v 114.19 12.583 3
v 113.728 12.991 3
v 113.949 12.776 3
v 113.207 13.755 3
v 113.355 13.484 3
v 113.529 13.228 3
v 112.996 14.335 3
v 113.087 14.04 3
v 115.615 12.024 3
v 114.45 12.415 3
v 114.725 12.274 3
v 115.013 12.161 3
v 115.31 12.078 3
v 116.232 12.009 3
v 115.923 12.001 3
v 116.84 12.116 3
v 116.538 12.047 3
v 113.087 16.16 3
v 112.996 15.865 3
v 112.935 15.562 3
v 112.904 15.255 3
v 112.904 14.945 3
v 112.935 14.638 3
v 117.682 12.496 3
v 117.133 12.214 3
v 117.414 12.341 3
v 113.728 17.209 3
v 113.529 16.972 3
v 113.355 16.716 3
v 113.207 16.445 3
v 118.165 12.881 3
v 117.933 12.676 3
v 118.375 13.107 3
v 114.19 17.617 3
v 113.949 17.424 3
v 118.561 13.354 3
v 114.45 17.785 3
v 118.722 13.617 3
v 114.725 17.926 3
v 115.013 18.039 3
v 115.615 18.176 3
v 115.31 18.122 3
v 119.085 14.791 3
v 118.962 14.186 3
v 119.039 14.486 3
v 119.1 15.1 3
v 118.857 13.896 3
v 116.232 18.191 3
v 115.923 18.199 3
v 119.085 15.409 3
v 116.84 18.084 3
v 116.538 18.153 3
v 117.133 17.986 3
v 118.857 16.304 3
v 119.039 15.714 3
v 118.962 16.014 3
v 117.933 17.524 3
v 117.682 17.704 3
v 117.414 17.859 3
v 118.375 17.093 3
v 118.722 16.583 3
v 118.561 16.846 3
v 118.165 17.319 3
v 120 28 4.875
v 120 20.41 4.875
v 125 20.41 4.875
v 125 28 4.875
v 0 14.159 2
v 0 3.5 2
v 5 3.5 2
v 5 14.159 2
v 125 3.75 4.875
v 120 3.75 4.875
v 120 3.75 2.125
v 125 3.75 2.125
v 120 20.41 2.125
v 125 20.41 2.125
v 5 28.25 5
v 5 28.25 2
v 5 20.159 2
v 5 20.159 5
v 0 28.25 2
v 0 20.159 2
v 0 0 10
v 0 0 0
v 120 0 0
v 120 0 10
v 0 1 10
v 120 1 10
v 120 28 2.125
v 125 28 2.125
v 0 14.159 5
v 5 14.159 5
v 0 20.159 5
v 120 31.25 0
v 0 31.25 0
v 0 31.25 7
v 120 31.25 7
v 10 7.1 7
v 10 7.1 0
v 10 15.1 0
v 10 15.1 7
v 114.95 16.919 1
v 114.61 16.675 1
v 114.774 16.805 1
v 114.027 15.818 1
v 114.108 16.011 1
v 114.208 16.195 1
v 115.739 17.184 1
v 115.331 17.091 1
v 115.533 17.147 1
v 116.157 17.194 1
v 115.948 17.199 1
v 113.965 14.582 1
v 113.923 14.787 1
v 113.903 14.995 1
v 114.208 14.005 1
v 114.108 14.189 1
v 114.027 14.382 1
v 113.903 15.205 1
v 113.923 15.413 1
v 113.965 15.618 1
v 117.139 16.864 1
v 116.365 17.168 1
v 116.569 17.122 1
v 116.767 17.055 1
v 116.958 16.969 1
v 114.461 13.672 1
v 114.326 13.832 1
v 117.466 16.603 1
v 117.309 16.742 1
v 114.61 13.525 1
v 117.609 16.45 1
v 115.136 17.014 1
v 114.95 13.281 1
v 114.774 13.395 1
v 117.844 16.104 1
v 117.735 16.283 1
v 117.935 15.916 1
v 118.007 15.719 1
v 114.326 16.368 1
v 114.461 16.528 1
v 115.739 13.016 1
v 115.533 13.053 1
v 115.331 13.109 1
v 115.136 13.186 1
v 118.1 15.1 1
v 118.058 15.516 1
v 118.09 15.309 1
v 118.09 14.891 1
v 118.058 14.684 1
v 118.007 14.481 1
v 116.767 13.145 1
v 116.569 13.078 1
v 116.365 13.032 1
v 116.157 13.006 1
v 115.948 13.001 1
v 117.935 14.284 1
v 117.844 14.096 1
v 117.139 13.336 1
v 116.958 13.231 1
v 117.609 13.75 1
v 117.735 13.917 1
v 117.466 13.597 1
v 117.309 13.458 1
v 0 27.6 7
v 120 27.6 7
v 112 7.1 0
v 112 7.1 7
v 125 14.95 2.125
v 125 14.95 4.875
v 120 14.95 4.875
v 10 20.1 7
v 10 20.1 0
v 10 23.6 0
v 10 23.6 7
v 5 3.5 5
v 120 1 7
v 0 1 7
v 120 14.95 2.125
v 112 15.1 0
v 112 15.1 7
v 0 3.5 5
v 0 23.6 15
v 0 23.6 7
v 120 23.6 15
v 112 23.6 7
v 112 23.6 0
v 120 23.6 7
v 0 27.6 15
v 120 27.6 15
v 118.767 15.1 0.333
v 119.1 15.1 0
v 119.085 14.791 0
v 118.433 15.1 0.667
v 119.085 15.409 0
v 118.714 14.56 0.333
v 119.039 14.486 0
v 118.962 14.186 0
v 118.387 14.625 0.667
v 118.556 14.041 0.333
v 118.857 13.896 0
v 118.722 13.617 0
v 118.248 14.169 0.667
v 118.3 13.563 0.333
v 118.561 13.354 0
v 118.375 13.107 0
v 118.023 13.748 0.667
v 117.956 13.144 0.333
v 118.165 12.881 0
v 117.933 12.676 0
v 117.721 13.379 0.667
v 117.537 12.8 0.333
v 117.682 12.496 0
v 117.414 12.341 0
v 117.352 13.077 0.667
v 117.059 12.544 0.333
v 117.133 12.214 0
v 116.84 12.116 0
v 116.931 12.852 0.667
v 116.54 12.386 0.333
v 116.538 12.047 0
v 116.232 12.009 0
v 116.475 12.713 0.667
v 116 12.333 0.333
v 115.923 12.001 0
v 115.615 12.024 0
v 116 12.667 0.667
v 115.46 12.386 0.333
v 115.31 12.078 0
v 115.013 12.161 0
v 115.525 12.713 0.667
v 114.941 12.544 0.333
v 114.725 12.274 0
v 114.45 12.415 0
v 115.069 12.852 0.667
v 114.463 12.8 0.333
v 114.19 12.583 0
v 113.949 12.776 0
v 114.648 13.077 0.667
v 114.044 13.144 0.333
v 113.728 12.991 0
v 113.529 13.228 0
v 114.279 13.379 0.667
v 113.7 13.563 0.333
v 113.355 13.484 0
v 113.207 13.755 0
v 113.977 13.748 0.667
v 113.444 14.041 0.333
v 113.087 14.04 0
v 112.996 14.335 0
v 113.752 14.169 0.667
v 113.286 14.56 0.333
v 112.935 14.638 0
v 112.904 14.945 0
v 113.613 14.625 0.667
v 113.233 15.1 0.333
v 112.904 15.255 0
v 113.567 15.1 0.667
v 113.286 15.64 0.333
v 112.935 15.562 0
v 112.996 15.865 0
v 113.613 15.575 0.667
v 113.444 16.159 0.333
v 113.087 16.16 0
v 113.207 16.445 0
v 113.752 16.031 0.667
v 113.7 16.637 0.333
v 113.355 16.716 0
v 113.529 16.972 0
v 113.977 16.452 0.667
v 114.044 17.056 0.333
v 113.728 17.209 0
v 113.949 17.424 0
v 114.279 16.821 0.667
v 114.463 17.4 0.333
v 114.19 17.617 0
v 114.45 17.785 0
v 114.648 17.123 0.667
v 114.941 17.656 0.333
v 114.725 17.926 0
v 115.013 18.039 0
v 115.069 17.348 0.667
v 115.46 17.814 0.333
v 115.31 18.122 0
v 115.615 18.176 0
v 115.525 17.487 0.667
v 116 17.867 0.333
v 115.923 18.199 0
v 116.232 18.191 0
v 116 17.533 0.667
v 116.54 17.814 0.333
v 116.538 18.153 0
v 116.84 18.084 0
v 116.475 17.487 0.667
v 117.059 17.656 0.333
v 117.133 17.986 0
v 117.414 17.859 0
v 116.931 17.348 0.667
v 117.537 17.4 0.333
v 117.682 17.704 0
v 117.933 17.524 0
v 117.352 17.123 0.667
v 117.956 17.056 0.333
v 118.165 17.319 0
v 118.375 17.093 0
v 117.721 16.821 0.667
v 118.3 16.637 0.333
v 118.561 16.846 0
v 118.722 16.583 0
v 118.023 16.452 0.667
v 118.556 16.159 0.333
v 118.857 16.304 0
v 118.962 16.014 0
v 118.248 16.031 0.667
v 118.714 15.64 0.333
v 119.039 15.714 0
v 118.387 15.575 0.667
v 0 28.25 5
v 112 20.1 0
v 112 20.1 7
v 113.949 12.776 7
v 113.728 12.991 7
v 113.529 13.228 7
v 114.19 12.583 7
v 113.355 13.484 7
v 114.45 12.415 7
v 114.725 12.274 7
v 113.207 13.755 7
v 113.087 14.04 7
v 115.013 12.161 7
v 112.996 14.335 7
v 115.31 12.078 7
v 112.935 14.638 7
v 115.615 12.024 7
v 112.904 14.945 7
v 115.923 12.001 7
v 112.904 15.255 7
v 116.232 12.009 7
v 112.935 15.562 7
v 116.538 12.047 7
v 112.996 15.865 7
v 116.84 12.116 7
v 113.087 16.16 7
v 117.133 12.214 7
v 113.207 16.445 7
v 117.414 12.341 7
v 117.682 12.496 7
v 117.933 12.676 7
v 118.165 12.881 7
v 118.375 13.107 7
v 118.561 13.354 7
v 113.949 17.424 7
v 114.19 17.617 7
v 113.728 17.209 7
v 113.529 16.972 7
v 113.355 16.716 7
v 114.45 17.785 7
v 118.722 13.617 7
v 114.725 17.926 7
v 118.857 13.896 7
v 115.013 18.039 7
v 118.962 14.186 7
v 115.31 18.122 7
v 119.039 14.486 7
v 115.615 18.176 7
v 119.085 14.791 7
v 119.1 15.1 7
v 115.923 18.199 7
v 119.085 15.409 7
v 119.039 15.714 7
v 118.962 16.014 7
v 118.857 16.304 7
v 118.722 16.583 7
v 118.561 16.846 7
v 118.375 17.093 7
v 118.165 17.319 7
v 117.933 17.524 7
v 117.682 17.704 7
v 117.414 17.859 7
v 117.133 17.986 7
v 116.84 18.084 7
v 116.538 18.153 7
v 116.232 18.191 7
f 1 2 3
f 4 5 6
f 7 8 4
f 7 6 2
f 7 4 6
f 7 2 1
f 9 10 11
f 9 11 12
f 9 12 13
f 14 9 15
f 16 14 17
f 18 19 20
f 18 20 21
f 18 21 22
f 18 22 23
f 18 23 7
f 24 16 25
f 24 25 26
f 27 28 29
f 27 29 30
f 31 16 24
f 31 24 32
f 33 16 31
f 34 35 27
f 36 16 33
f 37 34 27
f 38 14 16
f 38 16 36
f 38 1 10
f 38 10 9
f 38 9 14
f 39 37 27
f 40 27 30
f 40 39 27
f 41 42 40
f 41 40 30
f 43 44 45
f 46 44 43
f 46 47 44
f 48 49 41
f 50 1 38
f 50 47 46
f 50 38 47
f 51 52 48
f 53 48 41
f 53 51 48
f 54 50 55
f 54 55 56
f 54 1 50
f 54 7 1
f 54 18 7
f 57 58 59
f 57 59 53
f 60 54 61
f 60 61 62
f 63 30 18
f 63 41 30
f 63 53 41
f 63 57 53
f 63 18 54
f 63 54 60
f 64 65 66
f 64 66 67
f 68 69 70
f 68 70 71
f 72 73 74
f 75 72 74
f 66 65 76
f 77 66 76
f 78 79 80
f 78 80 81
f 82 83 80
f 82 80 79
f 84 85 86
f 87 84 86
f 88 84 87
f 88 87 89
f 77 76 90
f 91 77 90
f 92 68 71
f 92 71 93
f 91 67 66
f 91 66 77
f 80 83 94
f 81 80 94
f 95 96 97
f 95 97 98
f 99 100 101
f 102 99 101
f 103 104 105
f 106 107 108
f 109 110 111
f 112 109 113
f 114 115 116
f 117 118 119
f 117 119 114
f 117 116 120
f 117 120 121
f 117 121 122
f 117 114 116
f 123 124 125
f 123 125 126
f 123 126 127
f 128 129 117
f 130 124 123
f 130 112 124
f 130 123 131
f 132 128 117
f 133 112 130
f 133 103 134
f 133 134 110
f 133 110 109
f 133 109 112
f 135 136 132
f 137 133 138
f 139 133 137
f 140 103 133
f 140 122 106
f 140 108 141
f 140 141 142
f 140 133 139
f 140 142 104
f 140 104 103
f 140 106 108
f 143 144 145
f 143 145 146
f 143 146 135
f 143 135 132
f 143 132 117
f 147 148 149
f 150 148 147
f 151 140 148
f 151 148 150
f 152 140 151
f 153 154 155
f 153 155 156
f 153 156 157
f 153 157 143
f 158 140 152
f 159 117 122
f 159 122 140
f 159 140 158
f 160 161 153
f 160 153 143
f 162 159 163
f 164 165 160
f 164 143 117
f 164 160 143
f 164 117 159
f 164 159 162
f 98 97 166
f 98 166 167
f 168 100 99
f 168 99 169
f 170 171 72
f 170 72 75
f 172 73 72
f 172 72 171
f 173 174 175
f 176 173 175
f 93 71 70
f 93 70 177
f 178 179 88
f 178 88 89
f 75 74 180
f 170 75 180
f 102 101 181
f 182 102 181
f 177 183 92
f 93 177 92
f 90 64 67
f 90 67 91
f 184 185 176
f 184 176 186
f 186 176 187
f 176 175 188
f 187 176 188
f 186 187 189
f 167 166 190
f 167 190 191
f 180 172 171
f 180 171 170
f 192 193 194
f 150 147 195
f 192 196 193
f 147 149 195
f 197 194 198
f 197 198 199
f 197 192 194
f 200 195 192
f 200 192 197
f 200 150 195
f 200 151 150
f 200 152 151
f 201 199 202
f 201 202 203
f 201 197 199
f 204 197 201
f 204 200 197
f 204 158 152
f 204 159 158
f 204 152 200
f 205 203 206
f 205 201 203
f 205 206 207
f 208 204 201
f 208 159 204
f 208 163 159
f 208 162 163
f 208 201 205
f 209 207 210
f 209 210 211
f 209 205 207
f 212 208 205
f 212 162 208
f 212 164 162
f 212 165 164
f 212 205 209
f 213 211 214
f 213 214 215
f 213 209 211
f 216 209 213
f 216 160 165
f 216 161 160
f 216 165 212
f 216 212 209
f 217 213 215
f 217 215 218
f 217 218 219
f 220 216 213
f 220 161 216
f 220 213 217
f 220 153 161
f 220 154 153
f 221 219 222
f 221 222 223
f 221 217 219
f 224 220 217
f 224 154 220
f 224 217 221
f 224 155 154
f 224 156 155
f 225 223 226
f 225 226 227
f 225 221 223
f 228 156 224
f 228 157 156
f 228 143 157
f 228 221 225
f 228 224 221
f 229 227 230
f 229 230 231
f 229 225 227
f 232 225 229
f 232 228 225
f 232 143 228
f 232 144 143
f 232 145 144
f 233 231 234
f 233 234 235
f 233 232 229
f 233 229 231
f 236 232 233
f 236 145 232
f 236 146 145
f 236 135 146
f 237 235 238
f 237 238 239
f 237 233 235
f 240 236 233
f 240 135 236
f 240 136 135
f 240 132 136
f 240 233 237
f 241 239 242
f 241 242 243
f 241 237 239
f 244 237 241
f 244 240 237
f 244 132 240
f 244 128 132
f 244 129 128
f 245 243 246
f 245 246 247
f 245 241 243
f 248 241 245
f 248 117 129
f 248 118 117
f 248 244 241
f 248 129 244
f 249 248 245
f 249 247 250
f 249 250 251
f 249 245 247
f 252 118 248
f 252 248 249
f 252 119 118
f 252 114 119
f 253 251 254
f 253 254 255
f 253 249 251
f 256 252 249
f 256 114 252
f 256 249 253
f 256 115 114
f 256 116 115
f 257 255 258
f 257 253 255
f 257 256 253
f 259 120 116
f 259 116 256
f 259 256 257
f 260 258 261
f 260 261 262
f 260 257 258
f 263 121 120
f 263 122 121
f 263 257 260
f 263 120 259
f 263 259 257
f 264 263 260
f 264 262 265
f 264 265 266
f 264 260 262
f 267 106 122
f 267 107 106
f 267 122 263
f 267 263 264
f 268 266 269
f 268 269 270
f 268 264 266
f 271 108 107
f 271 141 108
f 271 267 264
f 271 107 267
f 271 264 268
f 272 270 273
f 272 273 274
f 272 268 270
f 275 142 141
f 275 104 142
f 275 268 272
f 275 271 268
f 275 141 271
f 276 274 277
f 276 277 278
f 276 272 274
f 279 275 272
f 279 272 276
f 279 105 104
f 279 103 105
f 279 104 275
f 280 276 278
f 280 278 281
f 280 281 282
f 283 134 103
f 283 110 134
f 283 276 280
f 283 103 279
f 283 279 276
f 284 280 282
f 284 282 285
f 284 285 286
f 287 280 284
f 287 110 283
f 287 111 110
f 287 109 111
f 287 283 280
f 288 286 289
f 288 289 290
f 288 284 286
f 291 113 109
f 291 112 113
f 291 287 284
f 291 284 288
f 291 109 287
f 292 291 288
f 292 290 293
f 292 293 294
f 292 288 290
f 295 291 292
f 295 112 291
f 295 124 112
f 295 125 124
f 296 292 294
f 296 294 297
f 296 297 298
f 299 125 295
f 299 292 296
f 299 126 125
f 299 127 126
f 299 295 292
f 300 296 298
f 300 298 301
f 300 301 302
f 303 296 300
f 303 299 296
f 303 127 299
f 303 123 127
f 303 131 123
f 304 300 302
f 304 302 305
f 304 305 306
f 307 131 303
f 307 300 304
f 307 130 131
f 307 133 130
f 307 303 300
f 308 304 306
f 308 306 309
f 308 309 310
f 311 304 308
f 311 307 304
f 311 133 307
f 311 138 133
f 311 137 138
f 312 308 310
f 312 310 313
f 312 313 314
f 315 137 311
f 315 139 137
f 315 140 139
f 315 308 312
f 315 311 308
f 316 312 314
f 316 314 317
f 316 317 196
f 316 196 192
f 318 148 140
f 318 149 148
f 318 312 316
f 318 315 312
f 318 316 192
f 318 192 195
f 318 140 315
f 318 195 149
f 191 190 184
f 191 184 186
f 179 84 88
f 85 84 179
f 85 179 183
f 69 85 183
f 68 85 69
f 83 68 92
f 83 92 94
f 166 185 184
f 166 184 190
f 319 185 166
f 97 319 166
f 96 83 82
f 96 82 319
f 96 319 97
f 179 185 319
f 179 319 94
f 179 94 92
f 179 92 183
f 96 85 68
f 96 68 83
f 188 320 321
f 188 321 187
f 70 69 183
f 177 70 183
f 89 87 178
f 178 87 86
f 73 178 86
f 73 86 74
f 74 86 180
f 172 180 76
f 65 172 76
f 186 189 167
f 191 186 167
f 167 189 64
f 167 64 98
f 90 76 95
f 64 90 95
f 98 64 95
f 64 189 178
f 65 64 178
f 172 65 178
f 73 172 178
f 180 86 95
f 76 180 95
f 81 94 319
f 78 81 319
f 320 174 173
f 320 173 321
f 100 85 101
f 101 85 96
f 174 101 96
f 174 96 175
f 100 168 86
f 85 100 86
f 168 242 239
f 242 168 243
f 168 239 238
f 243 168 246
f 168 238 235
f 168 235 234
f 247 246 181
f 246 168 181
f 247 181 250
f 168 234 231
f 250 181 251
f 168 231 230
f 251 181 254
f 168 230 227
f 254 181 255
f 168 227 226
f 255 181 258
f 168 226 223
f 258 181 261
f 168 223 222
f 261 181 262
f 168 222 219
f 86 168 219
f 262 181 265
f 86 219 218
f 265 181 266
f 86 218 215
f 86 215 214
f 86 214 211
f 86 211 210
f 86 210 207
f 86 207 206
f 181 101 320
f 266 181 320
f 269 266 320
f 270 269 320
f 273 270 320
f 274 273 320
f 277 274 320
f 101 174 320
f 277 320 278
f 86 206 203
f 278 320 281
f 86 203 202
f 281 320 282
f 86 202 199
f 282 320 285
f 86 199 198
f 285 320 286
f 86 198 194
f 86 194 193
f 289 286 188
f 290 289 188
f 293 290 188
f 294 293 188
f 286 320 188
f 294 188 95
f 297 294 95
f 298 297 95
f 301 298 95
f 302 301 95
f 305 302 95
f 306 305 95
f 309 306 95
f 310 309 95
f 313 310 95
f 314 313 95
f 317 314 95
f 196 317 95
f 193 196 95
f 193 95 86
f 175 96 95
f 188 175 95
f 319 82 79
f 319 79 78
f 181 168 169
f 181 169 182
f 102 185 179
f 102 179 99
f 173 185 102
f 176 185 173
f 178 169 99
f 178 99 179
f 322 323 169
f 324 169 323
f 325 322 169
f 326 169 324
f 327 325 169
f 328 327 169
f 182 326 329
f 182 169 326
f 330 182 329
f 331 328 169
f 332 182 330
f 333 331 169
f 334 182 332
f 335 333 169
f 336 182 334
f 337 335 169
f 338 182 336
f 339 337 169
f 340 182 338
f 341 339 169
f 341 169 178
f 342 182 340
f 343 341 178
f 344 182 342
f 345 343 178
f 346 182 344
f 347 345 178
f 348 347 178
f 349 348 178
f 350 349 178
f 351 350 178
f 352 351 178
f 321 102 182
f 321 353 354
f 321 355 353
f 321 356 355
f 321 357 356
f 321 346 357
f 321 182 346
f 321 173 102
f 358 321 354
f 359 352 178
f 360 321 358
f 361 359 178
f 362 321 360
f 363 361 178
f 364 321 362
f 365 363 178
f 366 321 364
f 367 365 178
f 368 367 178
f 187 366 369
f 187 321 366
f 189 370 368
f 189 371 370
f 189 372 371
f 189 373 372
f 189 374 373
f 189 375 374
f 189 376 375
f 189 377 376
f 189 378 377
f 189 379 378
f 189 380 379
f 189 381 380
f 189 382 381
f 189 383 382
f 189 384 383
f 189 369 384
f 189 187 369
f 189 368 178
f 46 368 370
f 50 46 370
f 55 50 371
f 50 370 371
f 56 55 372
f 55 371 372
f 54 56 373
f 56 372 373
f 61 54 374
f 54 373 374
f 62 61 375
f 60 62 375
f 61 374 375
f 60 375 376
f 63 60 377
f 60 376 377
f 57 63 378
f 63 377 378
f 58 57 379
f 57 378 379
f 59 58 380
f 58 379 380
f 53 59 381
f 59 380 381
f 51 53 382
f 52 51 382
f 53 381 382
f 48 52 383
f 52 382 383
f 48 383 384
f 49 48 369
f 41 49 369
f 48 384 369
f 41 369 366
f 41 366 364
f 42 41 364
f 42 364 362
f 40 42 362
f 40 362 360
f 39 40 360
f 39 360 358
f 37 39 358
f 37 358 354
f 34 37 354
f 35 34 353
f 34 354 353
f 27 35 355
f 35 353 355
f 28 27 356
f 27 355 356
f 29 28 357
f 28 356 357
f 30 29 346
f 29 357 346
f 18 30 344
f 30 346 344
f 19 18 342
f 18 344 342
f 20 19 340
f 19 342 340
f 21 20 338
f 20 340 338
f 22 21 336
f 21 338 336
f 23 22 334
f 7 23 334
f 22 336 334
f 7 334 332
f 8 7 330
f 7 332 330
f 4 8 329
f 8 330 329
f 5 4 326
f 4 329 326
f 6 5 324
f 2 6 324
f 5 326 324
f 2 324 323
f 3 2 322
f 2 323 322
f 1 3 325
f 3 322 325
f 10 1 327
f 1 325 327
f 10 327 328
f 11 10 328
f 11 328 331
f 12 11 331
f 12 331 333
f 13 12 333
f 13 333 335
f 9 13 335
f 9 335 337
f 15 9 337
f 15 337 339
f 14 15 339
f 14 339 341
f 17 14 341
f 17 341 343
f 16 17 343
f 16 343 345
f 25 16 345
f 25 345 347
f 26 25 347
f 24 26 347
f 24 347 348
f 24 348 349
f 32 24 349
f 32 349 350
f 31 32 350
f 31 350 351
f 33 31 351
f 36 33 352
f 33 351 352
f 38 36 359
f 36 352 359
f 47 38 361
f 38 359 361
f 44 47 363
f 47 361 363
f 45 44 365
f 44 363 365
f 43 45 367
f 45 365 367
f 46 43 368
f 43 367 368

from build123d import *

# Parameters (mm, degrees)
SKETCH1_W               = 120
SKETCH1_H               = 31.25
BOSS_EXTRUDE1_DEPTH     = 7
SKETCH2_W               = 120
SKETCH2_H               = 4
SKETCH2_H_2             = 1
BOSS_EXTRUDE2_DEPTH     = 8
CUT_EXTRUDE1_DEPTH      = 125.260059955
CUT_EXTRUDE1_DEPTH_BACK = 125.260059955
SKETCH3_W               = 102
SKETCH3_H               = 8
SKETCH3_H_2             = 3.5
CUT_EXTRUDE3_REACH      = 126.906
SKETCH6_W               = 5
SKETCH6_H               = 1
SKETCH4_W               = 3
SKETCH4_H               = 8.090611825
SKETCH4_H_2             = 10.659388175
CUT_EXTRUDE4_DEPTH      = 5
SKETCH5_W               = 2.75
SKETCH5_H               = 7.59
SKETCH5_H_2             = 11.2
BOSS_EXTRUDE3_DEPTH     = 5
SKETCH7_R               = 3.1
CUT_EXTRUDE5_DEPTH      = 4
CUT_EXTRUDE6_START      = -1
SKETCH8_R               = 3.1
CUT_EXTRUDE6_DEPTH      = 1
CHAMFER1_SIZE           = 1


with BuildPart() as part:
    # Sketch1 → Boss-Extrude1 (new body)
    with BuildSketch(Plane.XY):
        with Locations((60, 15.625)):
            Rectangle(SKETCH1_W, SKETCH1_H)
    extrude(amount=BOSS_EXTRUDE1_DEPTH)

    # Sketch2 → Boss-Extrude2 (add)
    with BuildSketch(Plane.XY.offset(7)):
        with Locations((60, 25.6)):
            Rectangle(SKETCH2_W, SKETCH2_H)
        with Locations((60, 0.5)):
            Rectangle(SKETCH2_W, SKETCH2_H_2)
    extrude(amount=BOSS_EXTRUDE2_DEPTH)

    # Sketch3 → Cut-Extrude1 (cut, two sides: drawn at the far end of the back side and taken through both)
    with BuildSketch(Plane.XY.offset(7).offset(-CUT_EXTRUDE1_DEPTH_BACK)):
        with Locations((61, 11.1)):
            Rectangle(SKETCH3_W, SKETCH3_H)
        with Locations((61, 21.85)):
            Rectangle(SKETCH3_W, SKETCH3_H_2)
    extrude(amount=CUT_EXTRUDE1_DEPTH + CUT_EXTRUDE1_DEPTH_BACK, mode=Mode.SUBTRACT)

    # Sketch6 → Cut-Extrude3 (cut, up to next)
    with BuildSketch(Plane.ZY, mode=Mode.PRIVATE) as cut_extrude3_sk1:
        with Locations((12.5, 0.5)):
            Rectangle(SKETCH6_W, SKETCH6_H)
    cut_extrude3_tool1 = extrude(cut_extrude3_sk1.sketch, amount=-CUT_EXTRUDE3_REACH, mode=Mode.PRIVATE) & part.part
    add(cut_extrude3_tool1.solids().sort_by_distance((0, 0.5, 12.5))[0], mode=Mode.SUBTRACT)

    # Sketch4 → Cut-Extrude4 (cut)
    with BuildSketch(Plane.ZY):
        with Locations((3.5, 24.204694088)):
            Rectangle(SKETCH4_W, SKETCH4_H)
        with Locations((3.5, 8.829694088)):
            Rectangle(SKETCH4_W, SKETCH4_H_2)
    extrude(amount=-CUT_EXTRUDE4_DEPTH, mode=Mode.SUBTRACT)

    # Sketch5 → Boss-Extrude3 (add)
    with BuildSketch(Plane(origin=(120, 0, 0), x_dir=(0, 0, -1), z_dir=(1, 0, 0))):
        with Locations((-3.5, 24.205)):
            Rectangle(SKETCH5_W, SKETCH5_H)
        with Locations((-3.5, 9.35)):
            Rectangle(SKETCH5_W, SKETCH5_H_2)
    extrude(amount=BOSS_EXTRUDE3_DEPTH)

    # Sketch7 → Cut-Extrude5 (cut)
    with BuildSketch(Plane.XY.offset(7)):
        with Locations((116, 15.1)):
            Circle(SKETCH7_R)
    extrude(amount=-CUT_EXTRUDE5_DEPTH, mode=Mode.SUBTRACT)

    # Sketch8 → Cut-Extrude6 (cut)
    with BuildSketch(Plane(origin=(0, 0, 0), x_dir=(-1, 0, 0), z_dir=(0, 0, -1)).offset(CUT_EXTRUDE6_START)):
        with Locations(Location((-116, 15.1, 0), (0, 0, 180))):
            Circle(SKETCH8_R)
    extrude(amount=CUT_EXTRUDE6_DEPTH, mode=Mode.SUBTRACT)

    # Chamfer1
    chamfer1_edges = [part.edges().sort_by_distance(p)[0] for p in [
        (112.9, 15.1, 1),
    ]]
    chamfer(chamfer1_edges, length=CHAMFER1_SIZE - 0.0001)  # a hair under: the kernel refuses the full size


solid = part.part
